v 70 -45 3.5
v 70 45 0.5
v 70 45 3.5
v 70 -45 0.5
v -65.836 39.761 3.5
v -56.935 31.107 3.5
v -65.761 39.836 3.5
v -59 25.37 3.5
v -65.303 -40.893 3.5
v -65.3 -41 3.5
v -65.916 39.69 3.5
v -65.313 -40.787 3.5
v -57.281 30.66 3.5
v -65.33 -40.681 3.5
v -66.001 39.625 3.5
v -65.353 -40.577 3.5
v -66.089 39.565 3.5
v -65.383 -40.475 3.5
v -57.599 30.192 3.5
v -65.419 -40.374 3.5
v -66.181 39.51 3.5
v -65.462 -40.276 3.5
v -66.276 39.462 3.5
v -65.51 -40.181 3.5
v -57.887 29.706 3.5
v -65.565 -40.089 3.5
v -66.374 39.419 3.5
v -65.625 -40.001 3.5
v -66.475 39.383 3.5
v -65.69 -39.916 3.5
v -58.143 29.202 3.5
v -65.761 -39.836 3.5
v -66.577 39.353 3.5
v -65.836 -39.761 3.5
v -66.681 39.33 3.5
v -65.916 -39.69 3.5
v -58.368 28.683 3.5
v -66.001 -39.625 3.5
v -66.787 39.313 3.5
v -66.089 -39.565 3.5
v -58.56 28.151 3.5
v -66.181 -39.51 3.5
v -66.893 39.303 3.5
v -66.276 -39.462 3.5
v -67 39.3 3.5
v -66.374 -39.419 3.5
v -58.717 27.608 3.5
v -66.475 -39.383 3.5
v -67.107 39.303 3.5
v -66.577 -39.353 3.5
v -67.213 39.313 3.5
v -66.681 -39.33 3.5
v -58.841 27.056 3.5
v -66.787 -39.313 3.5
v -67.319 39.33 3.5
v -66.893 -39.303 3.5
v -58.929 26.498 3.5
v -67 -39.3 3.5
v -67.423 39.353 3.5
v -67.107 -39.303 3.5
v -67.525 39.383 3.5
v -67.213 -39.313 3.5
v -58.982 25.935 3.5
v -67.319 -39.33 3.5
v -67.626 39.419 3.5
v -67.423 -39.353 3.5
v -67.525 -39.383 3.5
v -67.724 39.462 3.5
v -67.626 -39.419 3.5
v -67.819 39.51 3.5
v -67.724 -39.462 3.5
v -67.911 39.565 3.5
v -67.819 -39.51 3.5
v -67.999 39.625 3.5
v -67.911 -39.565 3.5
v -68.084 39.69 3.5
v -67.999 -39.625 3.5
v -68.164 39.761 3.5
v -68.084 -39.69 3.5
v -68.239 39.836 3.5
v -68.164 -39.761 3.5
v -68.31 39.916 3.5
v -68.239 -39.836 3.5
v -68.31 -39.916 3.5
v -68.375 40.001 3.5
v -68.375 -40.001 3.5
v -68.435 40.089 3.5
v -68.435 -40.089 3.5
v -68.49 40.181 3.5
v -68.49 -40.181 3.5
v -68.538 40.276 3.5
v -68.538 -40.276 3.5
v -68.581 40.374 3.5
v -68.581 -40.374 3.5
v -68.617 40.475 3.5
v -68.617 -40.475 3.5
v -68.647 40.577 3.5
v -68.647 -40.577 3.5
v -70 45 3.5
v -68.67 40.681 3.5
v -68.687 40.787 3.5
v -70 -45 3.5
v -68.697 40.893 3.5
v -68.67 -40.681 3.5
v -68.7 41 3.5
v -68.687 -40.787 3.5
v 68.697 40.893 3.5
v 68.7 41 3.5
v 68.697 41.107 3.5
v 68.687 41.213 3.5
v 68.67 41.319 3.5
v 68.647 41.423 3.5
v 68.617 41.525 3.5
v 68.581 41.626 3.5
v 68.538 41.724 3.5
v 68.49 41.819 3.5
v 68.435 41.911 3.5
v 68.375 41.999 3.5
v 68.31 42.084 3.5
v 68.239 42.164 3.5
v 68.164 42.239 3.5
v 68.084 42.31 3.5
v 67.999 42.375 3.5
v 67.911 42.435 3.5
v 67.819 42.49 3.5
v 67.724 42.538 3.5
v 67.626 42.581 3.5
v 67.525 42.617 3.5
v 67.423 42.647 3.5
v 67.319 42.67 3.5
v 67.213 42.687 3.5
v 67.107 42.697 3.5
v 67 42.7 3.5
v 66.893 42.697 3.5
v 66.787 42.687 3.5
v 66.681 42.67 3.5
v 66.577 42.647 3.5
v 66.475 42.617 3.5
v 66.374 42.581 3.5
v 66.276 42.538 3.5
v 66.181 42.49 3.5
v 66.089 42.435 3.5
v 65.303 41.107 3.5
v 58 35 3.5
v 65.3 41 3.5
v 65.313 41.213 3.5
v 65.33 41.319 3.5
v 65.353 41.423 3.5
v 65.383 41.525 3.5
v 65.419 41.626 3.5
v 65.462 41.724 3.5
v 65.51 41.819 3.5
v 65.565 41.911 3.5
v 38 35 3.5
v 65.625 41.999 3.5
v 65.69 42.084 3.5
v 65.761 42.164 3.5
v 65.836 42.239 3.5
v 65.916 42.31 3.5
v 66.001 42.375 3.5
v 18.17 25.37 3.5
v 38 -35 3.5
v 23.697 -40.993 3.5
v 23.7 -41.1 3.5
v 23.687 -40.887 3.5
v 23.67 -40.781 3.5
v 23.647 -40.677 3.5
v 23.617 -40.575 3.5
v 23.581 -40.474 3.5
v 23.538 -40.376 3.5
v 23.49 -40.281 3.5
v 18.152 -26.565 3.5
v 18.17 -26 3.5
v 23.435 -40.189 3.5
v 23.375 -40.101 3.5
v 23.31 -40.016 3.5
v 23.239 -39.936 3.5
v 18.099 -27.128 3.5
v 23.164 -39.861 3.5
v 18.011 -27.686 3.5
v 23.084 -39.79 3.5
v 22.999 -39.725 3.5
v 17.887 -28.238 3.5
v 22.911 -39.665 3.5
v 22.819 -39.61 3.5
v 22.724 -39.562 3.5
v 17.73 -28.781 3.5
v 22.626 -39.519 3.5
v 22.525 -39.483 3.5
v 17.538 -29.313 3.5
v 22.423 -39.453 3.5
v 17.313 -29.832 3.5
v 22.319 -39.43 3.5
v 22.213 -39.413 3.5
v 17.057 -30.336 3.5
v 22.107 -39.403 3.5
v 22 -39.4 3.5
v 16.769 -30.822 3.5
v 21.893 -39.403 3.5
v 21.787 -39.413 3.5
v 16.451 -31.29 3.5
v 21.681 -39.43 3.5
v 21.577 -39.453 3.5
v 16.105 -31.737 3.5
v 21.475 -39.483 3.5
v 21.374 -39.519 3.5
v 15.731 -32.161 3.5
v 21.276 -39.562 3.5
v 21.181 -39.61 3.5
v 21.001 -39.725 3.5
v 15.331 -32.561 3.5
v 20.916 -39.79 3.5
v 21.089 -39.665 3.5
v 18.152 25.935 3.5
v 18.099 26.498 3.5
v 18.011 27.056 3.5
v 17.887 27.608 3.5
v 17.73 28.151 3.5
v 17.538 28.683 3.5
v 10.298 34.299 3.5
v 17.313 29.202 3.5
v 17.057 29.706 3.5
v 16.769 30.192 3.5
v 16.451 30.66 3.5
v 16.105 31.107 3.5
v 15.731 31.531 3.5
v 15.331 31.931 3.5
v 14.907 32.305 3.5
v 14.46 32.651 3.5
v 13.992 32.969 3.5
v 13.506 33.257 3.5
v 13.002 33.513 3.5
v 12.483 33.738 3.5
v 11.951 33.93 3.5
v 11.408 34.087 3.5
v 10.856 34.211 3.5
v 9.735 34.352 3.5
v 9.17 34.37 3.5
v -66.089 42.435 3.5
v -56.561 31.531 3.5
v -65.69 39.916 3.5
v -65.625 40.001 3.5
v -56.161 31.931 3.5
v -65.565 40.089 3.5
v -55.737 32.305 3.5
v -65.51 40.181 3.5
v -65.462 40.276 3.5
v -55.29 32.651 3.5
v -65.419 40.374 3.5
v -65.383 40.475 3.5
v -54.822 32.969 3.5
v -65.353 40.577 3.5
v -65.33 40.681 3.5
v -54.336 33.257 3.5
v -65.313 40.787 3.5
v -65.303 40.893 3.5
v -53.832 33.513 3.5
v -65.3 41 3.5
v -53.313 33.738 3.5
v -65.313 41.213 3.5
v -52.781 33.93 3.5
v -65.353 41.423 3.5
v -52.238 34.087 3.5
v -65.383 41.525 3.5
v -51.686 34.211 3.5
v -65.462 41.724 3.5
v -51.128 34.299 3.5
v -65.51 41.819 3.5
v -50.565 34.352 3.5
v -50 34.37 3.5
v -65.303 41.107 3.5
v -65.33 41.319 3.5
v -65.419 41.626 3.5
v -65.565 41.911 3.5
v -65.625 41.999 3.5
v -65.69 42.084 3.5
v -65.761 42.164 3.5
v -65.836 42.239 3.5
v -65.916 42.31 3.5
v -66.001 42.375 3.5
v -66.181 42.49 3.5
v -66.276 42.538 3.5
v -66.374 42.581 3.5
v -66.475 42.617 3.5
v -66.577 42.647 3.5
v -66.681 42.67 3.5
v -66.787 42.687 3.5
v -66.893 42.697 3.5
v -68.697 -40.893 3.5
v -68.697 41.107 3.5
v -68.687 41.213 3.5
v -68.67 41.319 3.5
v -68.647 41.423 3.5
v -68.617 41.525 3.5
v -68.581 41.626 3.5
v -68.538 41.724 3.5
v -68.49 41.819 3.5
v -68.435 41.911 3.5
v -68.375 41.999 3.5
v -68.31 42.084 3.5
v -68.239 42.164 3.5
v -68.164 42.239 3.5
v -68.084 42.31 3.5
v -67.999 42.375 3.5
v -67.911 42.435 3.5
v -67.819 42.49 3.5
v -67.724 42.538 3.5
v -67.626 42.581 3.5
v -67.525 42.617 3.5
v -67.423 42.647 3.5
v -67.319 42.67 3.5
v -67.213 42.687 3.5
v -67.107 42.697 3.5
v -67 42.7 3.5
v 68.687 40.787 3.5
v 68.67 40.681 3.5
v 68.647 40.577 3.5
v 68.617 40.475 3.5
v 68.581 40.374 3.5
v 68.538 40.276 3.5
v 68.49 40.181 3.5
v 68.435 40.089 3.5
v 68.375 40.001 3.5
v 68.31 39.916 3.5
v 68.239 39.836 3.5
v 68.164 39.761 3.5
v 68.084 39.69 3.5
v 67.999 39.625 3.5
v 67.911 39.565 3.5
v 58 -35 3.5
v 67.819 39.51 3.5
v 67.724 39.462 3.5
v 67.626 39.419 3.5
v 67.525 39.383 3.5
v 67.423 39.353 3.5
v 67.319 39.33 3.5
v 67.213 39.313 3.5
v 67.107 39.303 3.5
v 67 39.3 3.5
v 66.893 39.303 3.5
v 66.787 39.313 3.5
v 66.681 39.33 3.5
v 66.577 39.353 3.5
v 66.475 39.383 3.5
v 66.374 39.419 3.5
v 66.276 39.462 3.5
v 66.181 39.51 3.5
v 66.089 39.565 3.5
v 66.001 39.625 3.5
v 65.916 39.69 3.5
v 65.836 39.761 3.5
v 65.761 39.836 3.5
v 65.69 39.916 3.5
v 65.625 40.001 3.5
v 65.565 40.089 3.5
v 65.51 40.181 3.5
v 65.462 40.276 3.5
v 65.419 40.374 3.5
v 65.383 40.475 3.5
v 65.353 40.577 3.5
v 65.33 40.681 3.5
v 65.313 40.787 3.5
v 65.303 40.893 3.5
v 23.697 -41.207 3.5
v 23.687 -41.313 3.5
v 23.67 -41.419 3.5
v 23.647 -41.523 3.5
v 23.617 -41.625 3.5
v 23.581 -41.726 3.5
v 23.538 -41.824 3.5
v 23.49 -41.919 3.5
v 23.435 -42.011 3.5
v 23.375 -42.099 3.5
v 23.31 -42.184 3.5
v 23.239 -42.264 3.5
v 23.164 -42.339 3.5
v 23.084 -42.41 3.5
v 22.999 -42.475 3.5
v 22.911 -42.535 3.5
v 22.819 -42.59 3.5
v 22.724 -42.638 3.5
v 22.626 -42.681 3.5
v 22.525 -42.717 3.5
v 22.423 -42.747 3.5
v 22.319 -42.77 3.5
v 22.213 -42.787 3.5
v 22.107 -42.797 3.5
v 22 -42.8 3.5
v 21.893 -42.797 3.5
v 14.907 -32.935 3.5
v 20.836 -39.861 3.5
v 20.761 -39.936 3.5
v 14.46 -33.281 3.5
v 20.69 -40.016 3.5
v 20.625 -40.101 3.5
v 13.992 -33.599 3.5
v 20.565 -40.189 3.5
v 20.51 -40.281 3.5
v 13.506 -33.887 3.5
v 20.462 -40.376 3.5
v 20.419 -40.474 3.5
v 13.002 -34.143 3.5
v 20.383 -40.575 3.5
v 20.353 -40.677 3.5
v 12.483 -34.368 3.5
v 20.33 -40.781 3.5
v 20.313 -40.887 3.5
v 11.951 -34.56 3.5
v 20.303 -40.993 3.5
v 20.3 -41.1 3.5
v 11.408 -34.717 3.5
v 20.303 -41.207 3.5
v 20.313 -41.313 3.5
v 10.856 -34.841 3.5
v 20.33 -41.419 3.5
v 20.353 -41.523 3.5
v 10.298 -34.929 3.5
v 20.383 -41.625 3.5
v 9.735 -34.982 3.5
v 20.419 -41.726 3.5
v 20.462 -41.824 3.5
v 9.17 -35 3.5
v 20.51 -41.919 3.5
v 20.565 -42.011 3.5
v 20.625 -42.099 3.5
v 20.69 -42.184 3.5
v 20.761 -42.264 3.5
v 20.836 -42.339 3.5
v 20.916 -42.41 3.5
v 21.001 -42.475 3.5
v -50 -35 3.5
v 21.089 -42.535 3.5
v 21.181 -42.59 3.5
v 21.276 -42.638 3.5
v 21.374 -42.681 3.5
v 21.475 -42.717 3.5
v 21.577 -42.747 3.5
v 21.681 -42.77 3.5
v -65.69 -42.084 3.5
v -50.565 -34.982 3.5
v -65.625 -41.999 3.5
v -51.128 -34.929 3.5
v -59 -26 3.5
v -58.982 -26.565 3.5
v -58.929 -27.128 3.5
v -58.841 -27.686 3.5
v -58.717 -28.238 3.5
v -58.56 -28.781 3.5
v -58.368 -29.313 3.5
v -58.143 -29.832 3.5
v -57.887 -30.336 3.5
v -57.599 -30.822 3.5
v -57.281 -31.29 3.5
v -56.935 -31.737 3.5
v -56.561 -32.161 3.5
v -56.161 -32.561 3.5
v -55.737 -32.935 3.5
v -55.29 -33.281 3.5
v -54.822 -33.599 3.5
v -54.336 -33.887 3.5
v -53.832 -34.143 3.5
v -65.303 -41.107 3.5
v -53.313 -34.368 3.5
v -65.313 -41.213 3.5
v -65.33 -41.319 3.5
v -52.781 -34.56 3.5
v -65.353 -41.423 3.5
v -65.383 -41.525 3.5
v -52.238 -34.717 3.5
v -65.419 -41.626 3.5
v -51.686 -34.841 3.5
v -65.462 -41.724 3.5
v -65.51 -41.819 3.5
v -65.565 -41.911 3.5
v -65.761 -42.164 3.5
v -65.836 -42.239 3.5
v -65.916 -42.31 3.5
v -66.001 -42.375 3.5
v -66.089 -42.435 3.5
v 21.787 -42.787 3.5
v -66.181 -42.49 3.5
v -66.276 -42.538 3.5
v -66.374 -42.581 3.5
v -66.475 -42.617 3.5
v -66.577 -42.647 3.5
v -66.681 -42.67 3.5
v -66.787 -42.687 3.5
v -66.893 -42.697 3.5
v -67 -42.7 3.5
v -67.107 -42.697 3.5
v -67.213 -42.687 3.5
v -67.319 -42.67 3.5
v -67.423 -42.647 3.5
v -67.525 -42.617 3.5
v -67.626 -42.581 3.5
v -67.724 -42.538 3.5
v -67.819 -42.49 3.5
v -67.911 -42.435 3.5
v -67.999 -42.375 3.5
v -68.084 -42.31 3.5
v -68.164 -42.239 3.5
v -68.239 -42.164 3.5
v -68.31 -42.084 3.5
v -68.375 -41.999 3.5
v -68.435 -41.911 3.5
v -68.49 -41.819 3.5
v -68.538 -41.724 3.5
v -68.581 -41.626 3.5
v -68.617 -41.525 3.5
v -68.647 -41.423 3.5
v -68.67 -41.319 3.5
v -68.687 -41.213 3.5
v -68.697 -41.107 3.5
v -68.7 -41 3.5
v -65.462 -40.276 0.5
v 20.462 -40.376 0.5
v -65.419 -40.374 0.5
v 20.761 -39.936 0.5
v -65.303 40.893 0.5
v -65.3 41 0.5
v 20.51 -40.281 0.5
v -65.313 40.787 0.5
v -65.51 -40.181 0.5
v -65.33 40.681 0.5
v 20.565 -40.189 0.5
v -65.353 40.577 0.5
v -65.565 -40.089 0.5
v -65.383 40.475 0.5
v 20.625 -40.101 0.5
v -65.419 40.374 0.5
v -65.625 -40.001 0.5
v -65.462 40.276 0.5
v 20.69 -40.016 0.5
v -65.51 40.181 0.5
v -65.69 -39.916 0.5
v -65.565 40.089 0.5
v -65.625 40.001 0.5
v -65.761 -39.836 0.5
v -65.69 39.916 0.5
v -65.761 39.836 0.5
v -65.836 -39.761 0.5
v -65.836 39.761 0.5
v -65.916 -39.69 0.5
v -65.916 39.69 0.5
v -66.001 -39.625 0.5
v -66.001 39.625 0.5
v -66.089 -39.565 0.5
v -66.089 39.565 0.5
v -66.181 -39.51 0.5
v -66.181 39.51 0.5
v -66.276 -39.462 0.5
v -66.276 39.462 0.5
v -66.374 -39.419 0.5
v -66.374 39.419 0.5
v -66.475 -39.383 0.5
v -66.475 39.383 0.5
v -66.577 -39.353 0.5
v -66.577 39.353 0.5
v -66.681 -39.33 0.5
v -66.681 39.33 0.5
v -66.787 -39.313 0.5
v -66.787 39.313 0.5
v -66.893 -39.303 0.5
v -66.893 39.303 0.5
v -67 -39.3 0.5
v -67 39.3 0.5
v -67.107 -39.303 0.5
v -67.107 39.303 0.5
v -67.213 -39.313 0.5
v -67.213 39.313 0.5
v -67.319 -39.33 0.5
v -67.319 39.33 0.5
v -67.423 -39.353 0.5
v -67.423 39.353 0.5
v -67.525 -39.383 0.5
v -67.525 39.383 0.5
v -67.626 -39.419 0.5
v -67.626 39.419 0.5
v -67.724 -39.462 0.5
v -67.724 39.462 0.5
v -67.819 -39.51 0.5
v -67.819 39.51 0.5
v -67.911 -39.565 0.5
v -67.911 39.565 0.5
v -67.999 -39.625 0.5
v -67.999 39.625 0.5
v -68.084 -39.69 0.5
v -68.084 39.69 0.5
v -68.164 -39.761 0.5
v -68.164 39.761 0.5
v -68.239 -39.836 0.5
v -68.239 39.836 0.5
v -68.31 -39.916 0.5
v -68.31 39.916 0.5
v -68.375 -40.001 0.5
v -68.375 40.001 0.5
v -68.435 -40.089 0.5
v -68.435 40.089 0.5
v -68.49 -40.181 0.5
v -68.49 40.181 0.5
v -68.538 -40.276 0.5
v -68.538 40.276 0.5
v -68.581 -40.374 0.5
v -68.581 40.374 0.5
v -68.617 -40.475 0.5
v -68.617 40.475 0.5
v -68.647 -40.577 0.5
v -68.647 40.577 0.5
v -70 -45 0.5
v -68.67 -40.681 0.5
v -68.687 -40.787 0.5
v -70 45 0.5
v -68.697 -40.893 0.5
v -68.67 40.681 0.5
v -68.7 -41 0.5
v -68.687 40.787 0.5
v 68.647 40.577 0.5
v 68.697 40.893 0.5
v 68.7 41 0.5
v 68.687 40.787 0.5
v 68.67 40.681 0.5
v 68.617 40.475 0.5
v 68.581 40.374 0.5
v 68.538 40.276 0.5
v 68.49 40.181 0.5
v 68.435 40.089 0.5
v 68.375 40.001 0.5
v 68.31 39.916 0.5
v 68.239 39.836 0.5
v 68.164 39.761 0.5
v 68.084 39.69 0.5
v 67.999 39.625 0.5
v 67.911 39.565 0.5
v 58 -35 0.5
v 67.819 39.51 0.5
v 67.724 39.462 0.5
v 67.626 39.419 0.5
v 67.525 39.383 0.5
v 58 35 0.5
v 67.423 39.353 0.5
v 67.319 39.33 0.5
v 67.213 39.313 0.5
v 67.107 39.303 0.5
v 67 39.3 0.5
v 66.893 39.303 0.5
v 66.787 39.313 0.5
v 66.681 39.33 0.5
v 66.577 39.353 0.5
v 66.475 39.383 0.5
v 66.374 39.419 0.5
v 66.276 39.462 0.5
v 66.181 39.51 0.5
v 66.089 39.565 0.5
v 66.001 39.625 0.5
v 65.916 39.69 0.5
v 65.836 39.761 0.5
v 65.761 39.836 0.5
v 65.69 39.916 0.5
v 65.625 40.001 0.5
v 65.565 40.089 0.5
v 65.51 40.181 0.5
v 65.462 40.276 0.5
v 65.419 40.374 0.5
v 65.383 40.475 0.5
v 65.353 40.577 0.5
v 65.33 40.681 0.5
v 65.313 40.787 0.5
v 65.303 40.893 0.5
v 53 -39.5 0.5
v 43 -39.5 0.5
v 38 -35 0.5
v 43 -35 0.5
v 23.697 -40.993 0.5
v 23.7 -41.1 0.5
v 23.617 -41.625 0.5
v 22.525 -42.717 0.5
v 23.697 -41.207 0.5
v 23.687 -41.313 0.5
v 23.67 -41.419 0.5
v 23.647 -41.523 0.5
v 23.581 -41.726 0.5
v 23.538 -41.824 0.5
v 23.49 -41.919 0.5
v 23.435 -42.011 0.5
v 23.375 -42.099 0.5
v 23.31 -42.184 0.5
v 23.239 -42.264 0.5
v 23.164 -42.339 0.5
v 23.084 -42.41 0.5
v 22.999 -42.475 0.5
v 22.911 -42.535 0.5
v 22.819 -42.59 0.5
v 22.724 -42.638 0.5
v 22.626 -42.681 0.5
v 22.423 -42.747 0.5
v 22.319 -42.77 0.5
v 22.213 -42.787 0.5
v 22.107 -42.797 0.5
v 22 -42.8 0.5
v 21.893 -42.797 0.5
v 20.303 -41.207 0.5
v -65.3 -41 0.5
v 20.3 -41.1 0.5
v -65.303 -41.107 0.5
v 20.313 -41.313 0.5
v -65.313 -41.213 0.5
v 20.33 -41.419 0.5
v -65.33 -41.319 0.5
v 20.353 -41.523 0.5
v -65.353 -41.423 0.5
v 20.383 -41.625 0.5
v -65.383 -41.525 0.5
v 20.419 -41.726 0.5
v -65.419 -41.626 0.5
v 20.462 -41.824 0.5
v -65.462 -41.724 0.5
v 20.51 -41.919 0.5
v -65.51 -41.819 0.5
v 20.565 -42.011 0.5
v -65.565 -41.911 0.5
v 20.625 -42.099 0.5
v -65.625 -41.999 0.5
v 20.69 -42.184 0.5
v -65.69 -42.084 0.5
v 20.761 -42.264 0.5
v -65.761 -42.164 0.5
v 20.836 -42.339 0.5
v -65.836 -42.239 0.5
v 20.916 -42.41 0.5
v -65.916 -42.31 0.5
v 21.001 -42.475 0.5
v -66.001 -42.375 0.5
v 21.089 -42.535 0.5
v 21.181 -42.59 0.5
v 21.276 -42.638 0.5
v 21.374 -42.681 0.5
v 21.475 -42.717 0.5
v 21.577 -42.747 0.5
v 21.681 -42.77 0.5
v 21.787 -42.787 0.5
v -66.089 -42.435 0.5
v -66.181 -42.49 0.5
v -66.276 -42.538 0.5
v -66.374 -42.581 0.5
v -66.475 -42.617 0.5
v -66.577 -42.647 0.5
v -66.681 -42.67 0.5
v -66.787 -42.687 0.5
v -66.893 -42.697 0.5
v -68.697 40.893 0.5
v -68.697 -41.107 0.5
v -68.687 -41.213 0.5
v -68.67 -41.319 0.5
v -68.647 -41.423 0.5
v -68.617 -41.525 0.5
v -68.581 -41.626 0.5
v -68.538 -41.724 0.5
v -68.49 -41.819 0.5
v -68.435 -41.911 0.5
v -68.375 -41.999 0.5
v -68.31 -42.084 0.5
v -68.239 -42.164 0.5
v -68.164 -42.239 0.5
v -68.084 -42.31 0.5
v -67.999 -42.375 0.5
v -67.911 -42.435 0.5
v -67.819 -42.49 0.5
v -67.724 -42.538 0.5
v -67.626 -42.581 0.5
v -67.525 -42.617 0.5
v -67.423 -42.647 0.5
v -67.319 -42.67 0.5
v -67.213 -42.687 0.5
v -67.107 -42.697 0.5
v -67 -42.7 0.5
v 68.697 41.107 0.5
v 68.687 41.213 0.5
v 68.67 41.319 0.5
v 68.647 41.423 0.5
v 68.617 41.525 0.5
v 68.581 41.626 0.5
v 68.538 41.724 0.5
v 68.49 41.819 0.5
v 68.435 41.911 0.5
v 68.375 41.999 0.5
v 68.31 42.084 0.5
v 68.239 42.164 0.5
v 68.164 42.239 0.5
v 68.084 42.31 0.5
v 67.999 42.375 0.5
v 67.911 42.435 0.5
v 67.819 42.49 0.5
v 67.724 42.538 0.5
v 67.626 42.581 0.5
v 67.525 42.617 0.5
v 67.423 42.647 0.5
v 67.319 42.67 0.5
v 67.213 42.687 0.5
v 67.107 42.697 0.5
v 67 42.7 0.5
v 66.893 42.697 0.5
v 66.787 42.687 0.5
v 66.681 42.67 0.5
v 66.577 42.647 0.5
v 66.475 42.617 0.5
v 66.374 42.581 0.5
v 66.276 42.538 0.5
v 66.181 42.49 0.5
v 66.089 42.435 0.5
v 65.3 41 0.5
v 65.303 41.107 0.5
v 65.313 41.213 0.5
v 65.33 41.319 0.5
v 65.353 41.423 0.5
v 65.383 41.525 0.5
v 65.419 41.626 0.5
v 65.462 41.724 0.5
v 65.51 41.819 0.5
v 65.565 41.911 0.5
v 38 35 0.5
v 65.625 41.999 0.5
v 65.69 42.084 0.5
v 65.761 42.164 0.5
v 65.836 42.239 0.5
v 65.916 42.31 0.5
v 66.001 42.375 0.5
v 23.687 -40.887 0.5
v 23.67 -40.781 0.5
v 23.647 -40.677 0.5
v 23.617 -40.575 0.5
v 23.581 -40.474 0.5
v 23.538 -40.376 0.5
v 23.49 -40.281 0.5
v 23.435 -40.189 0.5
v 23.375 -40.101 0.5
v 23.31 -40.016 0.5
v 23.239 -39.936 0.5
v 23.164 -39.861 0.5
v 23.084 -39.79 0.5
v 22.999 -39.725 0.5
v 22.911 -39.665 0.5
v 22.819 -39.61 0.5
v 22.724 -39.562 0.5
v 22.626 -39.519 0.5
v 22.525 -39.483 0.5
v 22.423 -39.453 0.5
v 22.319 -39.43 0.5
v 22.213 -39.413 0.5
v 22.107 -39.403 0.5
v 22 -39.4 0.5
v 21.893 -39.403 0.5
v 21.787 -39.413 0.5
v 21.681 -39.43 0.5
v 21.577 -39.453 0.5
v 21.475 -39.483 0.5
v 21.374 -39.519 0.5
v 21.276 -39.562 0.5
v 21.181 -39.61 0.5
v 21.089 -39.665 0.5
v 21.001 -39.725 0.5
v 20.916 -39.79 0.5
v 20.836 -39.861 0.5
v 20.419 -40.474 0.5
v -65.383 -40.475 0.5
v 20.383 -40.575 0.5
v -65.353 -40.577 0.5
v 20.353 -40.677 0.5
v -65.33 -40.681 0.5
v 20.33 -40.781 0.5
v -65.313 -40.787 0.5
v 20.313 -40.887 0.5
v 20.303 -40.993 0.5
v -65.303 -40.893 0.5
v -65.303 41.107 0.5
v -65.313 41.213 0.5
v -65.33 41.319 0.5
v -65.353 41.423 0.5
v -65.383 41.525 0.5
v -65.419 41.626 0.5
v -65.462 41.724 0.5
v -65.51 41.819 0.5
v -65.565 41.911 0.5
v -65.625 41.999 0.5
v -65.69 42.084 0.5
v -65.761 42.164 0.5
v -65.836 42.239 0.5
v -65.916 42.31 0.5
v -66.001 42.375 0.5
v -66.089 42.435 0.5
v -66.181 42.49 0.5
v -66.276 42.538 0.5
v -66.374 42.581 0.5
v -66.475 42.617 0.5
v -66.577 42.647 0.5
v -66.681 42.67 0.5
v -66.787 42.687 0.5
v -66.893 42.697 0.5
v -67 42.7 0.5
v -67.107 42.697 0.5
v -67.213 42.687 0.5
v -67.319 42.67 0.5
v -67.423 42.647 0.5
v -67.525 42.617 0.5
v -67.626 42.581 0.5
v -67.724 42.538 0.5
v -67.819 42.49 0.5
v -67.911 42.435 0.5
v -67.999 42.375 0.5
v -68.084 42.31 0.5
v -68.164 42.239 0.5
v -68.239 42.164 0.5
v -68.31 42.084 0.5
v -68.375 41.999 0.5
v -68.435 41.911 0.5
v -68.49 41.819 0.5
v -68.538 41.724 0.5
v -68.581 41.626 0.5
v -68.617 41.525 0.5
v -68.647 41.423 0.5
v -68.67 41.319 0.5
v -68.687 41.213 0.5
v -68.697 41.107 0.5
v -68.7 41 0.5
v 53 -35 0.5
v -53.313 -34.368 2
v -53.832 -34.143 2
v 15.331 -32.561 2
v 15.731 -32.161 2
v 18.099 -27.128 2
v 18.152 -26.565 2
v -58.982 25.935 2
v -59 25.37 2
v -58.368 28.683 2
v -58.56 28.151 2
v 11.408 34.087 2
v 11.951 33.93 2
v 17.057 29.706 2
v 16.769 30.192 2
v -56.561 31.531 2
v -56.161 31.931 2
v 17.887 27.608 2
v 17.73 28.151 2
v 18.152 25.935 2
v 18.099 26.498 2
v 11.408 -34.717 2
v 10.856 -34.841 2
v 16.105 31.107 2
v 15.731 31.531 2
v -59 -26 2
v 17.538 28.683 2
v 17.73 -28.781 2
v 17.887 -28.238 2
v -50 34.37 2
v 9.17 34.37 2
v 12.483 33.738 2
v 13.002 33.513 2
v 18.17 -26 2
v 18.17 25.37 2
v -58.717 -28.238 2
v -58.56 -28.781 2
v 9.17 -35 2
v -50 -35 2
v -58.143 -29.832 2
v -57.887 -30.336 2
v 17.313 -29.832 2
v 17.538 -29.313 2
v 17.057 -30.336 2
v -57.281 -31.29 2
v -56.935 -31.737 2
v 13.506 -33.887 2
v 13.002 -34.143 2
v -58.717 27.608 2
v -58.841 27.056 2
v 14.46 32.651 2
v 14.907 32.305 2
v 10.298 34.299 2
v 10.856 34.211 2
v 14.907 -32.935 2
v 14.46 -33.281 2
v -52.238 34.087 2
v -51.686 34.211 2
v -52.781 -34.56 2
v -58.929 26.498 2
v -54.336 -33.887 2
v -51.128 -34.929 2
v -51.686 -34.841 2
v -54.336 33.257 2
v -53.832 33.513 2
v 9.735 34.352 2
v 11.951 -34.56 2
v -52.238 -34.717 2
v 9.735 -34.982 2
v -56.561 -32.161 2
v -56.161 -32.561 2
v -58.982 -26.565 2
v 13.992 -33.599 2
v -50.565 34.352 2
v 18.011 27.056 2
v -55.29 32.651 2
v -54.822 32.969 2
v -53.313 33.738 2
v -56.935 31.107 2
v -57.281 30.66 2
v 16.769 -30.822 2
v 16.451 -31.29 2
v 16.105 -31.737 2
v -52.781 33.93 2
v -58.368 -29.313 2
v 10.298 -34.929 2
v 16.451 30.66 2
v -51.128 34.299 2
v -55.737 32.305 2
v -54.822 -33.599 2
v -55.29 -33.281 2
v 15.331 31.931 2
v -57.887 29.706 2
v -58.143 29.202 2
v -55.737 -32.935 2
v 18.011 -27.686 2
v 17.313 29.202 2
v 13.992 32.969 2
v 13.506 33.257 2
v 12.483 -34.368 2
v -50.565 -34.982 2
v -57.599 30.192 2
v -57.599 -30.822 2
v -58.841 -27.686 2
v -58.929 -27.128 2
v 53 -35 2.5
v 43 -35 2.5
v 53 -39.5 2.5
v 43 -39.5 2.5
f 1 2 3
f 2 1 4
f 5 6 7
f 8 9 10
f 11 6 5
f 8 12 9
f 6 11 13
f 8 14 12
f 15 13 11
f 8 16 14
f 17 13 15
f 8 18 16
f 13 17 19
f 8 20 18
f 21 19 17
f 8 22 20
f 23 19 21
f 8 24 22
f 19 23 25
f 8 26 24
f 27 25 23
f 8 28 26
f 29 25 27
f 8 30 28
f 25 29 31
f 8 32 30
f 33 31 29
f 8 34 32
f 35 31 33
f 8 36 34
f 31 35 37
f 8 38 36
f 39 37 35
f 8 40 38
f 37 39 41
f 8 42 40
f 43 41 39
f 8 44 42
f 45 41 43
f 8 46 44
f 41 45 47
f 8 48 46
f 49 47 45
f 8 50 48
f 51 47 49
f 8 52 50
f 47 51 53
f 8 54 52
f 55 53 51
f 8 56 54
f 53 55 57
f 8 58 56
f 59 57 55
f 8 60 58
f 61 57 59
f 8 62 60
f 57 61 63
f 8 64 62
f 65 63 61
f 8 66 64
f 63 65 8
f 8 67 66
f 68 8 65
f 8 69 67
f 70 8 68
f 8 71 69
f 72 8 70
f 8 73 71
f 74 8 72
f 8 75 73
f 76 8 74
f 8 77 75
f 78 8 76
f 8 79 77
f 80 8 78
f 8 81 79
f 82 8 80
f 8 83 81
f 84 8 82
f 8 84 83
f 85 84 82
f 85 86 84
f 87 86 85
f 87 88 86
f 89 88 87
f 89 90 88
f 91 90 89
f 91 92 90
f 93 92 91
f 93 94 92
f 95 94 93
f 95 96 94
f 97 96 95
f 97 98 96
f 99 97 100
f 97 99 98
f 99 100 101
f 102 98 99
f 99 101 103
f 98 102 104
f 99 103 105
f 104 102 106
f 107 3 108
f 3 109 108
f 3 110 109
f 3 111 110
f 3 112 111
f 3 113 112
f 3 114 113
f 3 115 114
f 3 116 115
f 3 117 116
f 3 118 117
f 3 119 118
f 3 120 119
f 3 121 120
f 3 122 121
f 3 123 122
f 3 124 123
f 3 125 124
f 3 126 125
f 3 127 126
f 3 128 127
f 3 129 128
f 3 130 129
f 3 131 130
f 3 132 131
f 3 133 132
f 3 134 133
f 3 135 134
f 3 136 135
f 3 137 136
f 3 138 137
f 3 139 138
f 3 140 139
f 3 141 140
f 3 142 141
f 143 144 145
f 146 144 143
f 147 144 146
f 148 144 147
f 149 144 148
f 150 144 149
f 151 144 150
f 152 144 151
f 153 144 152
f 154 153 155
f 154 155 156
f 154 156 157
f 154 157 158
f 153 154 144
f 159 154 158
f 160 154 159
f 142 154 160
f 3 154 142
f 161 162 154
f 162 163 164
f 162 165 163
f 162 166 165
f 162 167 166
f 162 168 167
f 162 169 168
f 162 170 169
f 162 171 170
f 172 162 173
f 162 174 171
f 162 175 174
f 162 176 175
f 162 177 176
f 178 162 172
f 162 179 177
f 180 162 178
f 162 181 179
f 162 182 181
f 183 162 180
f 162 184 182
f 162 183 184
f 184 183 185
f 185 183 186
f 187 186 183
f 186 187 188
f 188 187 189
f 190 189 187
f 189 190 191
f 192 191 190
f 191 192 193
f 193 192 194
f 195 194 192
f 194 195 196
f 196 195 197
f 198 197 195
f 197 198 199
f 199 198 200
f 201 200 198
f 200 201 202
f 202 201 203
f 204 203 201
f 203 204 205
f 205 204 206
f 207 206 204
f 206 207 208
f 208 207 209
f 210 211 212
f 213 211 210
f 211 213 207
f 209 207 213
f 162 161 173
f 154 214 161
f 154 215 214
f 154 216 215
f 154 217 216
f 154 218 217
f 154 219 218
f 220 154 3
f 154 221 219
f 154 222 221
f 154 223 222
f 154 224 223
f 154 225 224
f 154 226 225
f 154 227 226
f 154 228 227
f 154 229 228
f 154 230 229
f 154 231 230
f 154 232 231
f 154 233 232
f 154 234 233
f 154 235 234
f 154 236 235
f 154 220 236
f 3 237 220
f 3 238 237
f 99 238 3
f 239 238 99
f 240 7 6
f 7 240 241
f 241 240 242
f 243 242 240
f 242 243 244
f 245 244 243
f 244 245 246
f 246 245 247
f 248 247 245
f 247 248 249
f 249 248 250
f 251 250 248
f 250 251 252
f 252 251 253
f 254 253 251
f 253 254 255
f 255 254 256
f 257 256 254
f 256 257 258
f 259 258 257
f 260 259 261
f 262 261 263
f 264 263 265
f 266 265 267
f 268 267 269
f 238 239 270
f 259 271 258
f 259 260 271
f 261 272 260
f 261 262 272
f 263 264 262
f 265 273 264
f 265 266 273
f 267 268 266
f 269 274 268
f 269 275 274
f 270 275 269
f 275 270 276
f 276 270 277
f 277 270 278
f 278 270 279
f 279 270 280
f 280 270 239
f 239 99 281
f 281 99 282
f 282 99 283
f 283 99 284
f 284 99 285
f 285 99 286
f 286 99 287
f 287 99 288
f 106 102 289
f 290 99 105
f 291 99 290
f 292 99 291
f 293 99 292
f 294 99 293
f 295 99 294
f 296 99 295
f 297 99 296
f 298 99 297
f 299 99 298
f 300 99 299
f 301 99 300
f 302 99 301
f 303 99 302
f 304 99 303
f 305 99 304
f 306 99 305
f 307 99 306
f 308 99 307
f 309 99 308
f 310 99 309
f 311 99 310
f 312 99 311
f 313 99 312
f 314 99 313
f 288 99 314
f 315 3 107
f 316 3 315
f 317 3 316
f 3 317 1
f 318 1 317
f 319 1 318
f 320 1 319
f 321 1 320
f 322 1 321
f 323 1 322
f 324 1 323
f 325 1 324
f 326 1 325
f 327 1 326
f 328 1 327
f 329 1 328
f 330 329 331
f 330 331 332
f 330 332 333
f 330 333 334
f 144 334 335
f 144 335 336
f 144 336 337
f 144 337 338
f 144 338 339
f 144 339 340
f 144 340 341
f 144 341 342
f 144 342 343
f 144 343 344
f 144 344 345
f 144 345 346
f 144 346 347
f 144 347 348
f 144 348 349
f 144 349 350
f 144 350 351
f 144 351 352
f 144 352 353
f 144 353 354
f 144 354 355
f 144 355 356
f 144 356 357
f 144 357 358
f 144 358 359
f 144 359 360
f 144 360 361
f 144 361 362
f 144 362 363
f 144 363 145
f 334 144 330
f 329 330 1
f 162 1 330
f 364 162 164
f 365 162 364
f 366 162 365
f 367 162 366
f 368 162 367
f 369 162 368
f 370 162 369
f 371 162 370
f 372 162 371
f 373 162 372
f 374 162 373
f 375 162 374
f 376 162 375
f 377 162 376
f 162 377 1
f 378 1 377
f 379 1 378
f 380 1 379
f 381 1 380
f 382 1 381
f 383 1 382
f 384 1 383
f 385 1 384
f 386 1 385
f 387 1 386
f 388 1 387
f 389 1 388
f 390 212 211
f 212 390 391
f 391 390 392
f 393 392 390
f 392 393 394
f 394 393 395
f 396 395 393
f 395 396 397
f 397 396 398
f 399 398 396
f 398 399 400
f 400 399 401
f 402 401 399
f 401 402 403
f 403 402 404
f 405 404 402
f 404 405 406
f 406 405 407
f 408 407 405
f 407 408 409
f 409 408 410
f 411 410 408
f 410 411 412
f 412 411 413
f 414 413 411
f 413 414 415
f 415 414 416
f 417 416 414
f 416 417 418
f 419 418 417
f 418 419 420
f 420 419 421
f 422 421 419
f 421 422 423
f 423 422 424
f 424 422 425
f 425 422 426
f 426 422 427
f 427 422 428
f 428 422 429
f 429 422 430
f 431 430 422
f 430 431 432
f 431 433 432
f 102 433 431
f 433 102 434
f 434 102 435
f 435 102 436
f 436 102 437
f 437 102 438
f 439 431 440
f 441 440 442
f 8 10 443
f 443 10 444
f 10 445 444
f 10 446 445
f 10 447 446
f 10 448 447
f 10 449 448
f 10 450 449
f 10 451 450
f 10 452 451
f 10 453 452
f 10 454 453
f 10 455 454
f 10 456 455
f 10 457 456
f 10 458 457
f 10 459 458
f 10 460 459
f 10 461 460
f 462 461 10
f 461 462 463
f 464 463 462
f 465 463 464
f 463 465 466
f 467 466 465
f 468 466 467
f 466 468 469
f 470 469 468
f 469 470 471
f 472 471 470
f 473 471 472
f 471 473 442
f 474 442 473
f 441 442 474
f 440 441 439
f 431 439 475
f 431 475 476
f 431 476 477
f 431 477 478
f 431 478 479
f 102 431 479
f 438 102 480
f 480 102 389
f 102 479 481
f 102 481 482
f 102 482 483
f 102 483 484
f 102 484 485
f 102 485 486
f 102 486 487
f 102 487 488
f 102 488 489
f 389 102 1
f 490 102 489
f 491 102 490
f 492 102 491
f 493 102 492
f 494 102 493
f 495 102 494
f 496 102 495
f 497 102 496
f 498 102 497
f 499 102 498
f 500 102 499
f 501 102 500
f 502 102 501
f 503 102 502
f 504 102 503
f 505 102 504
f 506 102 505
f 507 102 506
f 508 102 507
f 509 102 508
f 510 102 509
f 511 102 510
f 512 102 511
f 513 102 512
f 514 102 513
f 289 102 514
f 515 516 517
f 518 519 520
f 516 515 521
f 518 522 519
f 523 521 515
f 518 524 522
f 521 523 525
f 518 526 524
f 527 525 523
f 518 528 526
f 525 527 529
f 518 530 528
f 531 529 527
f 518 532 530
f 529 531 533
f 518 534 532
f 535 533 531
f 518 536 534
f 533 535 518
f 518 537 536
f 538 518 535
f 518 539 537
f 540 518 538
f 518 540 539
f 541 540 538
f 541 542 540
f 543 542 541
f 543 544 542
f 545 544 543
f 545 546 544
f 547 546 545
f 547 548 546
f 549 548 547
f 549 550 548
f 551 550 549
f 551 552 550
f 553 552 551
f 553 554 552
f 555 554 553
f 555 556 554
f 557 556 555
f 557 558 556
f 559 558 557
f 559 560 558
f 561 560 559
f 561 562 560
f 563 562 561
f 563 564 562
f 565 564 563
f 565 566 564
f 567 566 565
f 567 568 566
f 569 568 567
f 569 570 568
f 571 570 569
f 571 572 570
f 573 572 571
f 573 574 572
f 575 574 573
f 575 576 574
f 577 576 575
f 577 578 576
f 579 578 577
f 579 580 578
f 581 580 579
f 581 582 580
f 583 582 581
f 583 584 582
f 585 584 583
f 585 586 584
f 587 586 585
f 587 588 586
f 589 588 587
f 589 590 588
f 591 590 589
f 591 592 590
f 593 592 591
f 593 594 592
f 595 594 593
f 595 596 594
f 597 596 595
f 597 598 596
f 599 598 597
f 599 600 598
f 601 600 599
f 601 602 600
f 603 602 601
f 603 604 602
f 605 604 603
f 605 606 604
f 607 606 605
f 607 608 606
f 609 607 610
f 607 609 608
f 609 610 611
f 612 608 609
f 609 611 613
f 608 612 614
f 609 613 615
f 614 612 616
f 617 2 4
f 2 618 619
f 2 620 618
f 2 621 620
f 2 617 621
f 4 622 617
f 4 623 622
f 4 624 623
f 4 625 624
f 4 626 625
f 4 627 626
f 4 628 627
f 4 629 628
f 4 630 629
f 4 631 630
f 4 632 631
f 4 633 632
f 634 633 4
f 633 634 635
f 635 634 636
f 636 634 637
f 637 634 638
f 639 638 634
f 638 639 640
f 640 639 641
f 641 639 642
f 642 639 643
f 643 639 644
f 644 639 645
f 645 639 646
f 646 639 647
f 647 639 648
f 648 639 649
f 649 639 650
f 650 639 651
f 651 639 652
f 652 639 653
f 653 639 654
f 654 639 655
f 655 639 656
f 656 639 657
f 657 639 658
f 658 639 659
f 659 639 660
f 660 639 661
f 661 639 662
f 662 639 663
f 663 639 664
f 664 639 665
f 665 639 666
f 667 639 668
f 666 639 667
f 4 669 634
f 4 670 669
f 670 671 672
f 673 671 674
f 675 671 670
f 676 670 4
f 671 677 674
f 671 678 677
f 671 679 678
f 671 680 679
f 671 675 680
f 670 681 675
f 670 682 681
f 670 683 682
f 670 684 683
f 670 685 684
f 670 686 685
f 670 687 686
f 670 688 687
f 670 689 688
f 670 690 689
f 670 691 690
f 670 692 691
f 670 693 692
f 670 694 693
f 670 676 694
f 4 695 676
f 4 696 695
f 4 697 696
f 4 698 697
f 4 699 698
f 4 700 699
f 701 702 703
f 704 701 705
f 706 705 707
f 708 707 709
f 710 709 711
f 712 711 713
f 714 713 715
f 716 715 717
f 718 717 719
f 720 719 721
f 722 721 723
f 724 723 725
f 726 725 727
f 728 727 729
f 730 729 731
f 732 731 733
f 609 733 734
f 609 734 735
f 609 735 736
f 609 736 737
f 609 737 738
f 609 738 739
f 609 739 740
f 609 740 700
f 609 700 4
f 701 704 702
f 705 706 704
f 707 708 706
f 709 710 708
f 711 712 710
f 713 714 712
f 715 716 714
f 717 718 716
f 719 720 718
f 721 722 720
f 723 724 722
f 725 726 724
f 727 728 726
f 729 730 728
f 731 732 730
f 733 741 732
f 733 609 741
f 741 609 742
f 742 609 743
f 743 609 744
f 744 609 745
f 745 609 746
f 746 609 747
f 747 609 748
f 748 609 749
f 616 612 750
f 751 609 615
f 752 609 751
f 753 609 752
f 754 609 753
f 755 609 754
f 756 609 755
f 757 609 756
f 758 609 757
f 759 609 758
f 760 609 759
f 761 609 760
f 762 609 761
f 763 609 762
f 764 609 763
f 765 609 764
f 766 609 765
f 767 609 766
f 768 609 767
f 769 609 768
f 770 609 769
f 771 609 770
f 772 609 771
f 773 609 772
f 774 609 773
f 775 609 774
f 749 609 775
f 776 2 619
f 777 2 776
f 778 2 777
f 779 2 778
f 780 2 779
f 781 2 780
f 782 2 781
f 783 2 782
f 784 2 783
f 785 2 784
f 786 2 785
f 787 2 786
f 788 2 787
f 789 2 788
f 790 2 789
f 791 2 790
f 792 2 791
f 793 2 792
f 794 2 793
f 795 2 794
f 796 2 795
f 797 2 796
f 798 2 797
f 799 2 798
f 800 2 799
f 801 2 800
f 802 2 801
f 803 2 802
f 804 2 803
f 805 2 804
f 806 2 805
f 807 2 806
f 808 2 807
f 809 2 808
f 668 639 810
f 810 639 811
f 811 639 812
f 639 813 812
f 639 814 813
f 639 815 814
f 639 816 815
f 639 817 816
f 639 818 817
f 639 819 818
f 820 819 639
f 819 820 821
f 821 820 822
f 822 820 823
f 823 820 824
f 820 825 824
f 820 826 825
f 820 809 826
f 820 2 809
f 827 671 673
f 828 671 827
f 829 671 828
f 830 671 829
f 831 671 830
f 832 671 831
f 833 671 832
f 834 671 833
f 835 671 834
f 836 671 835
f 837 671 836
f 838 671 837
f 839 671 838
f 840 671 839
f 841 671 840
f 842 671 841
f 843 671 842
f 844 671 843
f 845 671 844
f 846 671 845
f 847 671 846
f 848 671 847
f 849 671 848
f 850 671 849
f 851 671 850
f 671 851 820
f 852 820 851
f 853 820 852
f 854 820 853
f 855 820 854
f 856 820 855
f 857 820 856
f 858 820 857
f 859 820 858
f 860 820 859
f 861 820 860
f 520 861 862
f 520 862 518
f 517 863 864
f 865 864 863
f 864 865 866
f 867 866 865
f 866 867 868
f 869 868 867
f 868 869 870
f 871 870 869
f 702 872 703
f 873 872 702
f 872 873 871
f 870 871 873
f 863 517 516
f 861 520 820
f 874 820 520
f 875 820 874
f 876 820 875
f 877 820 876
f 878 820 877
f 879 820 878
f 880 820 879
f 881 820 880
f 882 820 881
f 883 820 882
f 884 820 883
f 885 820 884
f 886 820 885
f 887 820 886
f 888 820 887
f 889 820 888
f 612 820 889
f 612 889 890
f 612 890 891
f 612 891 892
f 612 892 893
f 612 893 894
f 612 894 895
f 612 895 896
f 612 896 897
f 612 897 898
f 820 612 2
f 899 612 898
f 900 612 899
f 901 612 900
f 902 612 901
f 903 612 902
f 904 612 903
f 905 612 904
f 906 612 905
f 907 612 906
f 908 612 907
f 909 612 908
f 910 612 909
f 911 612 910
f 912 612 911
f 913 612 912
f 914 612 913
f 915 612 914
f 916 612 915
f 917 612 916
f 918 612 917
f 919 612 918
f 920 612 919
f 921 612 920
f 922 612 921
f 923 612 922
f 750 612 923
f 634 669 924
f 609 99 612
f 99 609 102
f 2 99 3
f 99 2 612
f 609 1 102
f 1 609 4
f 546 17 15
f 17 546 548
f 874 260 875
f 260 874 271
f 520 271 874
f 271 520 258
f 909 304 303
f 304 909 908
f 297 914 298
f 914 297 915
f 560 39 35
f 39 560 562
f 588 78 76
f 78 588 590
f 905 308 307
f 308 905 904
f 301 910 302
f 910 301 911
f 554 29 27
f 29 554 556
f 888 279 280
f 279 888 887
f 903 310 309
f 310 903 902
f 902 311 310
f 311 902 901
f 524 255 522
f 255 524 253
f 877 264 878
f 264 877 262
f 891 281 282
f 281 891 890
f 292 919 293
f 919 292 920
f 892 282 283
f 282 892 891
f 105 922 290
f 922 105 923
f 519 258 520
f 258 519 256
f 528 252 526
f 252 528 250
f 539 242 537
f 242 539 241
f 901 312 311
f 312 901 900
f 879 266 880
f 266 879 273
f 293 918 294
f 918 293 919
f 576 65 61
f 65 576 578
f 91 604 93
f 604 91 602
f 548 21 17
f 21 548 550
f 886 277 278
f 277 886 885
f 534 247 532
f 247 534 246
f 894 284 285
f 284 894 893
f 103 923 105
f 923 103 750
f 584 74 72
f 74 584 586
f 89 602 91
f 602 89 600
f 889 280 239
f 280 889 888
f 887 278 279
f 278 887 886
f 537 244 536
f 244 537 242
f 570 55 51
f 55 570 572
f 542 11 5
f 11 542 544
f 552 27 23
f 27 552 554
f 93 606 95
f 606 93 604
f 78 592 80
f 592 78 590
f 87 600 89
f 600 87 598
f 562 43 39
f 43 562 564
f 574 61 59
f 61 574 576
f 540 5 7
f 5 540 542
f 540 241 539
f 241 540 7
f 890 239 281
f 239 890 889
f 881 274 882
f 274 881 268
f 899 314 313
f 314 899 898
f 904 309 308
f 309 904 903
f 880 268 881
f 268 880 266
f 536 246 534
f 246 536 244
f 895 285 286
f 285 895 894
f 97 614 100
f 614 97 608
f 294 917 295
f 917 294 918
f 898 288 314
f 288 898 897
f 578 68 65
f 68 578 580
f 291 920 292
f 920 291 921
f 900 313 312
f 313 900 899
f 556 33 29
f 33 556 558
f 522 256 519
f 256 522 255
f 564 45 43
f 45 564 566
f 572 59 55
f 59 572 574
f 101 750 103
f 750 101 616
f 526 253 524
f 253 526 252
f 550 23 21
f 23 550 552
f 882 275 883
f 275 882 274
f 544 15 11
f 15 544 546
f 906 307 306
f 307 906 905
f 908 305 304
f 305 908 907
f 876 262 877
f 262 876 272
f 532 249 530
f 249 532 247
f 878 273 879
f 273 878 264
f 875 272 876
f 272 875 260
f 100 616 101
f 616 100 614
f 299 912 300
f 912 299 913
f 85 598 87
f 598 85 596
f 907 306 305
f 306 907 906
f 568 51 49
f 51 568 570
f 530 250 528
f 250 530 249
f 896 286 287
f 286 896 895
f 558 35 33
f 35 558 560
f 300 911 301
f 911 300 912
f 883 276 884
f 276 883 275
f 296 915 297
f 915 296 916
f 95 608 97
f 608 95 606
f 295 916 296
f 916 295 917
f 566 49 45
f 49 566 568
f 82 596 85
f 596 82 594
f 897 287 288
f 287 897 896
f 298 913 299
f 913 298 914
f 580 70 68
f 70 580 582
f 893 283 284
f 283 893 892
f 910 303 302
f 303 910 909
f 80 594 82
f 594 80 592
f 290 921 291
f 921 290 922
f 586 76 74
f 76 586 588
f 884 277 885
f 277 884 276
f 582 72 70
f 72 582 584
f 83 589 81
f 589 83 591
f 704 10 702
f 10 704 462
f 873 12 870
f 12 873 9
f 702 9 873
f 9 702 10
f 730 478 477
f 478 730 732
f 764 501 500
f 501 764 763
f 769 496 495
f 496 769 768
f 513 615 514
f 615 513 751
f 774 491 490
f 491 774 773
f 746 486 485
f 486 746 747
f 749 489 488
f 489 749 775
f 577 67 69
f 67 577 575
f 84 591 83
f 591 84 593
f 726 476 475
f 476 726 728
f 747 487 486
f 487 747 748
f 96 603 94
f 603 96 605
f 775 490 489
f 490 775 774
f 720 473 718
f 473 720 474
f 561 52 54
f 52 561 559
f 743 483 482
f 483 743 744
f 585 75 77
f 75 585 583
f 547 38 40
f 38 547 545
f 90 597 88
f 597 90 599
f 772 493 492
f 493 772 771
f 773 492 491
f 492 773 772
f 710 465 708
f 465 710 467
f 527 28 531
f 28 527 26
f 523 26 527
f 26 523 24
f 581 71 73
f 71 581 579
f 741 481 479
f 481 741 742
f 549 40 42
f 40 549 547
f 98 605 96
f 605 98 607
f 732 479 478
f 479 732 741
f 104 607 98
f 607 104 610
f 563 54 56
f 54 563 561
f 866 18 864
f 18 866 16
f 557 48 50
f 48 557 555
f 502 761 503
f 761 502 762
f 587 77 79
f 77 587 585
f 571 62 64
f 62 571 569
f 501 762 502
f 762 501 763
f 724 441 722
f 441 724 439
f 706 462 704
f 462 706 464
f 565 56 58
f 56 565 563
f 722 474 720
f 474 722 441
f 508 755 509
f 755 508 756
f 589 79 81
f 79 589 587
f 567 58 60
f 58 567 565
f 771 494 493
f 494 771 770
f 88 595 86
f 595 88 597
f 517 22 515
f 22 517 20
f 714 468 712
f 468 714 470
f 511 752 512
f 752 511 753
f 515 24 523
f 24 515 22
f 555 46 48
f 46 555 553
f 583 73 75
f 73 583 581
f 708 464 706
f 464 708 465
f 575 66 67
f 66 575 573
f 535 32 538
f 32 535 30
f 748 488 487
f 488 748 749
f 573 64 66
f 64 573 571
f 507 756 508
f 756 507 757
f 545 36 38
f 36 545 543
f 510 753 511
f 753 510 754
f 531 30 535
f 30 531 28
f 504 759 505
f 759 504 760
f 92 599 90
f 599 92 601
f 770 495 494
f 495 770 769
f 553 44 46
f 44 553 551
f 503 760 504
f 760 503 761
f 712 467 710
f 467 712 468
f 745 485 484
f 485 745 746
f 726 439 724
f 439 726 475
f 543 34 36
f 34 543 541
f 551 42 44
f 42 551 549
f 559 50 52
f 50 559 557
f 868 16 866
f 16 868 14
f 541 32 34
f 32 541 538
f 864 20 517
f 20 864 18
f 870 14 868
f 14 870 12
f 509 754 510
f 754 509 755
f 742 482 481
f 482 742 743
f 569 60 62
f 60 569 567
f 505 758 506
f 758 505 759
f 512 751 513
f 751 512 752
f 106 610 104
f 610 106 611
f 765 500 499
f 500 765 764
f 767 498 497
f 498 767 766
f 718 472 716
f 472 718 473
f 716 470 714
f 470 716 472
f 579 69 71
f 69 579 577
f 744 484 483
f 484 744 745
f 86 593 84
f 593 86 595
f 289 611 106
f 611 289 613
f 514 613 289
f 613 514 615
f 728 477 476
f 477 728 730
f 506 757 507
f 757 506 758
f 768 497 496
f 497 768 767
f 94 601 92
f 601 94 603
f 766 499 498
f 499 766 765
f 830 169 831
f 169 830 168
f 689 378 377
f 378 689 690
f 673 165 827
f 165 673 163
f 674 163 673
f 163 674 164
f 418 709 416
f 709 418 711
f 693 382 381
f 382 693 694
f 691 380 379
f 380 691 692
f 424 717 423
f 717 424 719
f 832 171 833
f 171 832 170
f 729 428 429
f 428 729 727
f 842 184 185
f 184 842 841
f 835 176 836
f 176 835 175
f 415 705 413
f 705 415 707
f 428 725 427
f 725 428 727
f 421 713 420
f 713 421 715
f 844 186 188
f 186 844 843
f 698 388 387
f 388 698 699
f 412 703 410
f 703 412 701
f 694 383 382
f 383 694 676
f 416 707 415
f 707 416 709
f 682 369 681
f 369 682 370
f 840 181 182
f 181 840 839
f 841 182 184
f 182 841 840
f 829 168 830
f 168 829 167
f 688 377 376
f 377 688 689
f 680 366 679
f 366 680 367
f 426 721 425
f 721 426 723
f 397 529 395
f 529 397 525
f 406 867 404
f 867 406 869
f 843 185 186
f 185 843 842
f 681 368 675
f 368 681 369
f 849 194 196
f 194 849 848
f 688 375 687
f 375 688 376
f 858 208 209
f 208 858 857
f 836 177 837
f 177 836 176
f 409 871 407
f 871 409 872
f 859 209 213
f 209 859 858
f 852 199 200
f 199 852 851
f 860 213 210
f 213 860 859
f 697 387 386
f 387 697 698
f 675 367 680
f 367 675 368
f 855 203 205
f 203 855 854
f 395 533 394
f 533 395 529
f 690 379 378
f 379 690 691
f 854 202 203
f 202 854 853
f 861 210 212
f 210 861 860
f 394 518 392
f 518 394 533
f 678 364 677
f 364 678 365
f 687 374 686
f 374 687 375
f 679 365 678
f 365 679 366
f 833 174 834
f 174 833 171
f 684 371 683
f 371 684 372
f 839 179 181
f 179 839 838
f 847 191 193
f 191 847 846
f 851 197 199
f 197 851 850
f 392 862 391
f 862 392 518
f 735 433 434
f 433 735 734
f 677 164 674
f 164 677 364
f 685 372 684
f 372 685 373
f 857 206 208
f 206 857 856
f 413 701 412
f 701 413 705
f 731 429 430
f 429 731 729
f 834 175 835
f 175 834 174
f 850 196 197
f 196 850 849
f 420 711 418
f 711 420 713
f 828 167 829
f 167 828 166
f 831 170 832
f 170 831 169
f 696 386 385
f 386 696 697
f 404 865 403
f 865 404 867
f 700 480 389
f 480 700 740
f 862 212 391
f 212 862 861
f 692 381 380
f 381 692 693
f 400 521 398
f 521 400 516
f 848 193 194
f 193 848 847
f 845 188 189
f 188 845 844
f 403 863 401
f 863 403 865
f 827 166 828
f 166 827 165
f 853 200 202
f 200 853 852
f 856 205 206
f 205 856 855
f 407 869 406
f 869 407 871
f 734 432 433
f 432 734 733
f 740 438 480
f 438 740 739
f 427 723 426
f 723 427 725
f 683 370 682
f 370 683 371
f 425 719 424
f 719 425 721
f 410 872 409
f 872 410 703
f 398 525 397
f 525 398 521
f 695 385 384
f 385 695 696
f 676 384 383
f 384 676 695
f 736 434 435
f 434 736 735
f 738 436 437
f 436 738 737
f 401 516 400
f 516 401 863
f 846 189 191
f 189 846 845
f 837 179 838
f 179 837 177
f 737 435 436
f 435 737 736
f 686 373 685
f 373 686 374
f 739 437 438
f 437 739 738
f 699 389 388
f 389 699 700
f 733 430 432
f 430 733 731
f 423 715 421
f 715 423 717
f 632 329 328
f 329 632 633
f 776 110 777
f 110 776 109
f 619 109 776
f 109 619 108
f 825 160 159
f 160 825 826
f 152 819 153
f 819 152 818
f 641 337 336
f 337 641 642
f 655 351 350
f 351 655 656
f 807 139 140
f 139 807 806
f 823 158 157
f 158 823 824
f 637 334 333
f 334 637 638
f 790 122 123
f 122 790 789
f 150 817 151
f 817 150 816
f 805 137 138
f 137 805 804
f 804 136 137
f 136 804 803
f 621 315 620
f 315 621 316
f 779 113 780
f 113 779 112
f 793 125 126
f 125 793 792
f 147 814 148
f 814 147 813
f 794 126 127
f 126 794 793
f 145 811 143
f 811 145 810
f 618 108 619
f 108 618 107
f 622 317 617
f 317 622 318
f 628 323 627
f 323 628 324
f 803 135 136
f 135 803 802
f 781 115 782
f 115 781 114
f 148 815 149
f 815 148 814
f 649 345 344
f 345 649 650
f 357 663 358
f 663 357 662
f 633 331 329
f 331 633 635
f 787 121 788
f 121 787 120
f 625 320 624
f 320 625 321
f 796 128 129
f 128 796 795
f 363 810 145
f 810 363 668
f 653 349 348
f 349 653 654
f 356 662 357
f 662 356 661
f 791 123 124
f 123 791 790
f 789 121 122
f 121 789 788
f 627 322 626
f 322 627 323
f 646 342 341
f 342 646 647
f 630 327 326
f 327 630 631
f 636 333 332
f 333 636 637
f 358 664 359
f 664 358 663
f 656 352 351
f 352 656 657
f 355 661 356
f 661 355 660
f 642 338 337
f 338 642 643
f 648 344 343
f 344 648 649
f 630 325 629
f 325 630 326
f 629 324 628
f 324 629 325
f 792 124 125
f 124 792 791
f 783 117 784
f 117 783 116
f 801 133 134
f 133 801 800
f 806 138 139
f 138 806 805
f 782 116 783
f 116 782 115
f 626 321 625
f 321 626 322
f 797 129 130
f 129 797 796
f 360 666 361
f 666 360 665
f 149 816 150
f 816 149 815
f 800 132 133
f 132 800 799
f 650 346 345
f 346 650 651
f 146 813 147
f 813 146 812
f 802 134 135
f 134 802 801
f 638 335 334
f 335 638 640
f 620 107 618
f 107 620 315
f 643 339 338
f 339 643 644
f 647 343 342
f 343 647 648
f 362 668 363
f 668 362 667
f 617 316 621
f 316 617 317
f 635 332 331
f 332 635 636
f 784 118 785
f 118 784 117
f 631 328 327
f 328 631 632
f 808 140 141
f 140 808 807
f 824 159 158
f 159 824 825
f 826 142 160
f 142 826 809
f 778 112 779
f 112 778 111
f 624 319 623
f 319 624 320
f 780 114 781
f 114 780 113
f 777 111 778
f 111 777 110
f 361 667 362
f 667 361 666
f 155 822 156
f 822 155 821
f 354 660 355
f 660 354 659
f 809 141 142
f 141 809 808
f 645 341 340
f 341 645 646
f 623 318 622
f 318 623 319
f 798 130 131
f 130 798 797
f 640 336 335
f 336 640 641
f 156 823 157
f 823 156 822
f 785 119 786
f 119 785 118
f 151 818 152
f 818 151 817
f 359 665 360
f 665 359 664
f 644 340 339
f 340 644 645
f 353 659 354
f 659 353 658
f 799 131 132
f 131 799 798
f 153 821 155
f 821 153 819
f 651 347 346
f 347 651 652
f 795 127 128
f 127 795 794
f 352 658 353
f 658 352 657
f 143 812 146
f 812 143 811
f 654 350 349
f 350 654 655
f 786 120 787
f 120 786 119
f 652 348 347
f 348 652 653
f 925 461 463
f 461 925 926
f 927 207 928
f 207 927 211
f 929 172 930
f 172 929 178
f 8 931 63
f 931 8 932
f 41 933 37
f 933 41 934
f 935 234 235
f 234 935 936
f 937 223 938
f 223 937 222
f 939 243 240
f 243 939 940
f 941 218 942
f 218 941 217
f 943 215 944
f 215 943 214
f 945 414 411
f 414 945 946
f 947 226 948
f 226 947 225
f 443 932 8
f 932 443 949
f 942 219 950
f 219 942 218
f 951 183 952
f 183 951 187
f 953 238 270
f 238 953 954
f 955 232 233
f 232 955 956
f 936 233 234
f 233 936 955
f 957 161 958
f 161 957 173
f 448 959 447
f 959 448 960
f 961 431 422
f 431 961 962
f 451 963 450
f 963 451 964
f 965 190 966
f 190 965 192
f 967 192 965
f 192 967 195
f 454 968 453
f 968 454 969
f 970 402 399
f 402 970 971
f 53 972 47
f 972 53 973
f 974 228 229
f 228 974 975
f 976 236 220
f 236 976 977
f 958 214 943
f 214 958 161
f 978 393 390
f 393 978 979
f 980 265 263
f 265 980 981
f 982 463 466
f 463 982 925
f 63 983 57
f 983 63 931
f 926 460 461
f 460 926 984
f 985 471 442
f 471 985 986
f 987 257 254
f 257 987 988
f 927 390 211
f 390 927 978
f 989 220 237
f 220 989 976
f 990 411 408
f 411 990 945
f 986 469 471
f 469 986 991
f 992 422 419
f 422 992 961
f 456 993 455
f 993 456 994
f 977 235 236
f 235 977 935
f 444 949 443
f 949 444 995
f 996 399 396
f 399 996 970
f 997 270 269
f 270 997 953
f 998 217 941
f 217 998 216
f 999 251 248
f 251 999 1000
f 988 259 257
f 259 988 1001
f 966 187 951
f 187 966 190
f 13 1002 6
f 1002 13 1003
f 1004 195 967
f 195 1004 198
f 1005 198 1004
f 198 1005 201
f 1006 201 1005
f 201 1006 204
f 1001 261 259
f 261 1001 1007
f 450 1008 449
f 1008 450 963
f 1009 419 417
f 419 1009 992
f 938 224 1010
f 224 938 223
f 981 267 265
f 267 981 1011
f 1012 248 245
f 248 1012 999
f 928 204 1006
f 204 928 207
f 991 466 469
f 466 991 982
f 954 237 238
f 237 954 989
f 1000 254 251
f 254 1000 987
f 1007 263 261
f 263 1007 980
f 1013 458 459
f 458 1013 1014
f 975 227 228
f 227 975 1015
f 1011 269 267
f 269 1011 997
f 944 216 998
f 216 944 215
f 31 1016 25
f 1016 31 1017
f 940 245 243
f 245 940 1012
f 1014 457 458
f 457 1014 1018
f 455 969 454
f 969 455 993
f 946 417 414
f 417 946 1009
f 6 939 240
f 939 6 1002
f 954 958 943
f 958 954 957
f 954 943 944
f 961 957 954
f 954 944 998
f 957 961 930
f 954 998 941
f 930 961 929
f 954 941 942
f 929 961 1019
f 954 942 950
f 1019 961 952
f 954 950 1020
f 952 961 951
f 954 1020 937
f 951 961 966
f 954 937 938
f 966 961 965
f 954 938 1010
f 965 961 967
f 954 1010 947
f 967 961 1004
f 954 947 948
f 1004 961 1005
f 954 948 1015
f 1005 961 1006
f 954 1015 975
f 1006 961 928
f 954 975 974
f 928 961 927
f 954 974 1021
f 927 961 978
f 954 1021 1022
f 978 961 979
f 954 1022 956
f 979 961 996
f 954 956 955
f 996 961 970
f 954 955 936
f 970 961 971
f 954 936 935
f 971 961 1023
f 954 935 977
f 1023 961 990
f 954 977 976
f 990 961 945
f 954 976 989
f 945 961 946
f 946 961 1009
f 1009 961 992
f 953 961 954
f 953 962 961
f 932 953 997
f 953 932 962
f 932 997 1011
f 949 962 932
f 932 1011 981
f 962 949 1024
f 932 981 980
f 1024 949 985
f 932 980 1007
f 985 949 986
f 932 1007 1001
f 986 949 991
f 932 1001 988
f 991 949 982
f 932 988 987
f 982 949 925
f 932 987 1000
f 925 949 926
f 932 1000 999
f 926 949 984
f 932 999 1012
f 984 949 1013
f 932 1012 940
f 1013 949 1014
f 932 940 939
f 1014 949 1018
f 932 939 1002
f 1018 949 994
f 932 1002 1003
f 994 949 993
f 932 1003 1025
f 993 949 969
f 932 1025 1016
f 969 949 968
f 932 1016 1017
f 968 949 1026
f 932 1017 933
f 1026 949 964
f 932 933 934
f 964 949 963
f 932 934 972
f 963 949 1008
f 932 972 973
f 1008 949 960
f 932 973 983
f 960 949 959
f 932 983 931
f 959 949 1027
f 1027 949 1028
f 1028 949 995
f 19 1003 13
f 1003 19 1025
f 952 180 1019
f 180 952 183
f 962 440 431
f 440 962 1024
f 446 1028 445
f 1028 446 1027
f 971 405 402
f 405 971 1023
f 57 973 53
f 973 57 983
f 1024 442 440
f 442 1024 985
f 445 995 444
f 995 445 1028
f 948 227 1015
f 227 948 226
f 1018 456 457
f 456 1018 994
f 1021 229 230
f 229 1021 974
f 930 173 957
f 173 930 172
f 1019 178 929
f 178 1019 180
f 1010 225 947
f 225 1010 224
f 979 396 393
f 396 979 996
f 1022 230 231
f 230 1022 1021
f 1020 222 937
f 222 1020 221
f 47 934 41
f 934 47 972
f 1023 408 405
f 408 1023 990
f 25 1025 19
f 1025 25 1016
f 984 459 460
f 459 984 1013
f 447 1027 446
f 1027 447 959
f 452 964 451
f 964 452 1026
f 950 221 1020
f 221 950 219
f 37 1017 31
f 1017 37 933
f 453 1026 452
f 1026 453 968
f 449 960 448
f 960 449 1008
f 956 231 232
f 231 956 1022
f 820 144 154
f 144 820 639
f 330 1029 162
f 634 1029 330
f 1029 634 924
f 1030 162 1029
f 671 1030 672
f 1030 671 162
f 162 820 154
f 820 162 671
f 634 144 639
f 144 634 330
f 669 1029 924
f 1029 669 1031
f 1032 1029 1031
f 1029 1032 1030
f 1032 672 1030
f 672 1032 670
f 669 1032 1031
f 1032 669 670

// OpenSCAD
$fn=100;
    difference(){
        translate([0,0,2])
        cube([140, 90, 3],true);
        
        translate([-67, 41, -8])
        cylinder(h=19.1, r = 1.7);
        
        translate([-67, -41, -8])
        cylinder(h=19.1, r = 1.7);
        
        translate([22, -41.1, -8])
        cylinder(h=19.1, r = 1.7);
        
        
     translate([67, 41, -8])
        cylinder(h=19.1, r = 1.7);
        
        translate([-60, -36, 2])
        color("gold")
    hull(){
    translate([69.17, 61.37, 0])
    cylinder(r = 9, h = 1.8);
    translate([69.17, 10, 0])
    cylinder(r = 9, h = 1.8);
    translate([10, 10, 0])
    cylinder(r = 9, h = 1.8);
    translate([10, 61.37, 0])
    cylinder(r = 9, h = 1.8);
}

rotate([0,0,90])
    translate([0, -48, 2])
       
        cube([70,20,3], true);

translate([48,-37,1])
    cube([10,5,3], true);

    };
    
    
    
    
    
 
    
      
        
    
     
